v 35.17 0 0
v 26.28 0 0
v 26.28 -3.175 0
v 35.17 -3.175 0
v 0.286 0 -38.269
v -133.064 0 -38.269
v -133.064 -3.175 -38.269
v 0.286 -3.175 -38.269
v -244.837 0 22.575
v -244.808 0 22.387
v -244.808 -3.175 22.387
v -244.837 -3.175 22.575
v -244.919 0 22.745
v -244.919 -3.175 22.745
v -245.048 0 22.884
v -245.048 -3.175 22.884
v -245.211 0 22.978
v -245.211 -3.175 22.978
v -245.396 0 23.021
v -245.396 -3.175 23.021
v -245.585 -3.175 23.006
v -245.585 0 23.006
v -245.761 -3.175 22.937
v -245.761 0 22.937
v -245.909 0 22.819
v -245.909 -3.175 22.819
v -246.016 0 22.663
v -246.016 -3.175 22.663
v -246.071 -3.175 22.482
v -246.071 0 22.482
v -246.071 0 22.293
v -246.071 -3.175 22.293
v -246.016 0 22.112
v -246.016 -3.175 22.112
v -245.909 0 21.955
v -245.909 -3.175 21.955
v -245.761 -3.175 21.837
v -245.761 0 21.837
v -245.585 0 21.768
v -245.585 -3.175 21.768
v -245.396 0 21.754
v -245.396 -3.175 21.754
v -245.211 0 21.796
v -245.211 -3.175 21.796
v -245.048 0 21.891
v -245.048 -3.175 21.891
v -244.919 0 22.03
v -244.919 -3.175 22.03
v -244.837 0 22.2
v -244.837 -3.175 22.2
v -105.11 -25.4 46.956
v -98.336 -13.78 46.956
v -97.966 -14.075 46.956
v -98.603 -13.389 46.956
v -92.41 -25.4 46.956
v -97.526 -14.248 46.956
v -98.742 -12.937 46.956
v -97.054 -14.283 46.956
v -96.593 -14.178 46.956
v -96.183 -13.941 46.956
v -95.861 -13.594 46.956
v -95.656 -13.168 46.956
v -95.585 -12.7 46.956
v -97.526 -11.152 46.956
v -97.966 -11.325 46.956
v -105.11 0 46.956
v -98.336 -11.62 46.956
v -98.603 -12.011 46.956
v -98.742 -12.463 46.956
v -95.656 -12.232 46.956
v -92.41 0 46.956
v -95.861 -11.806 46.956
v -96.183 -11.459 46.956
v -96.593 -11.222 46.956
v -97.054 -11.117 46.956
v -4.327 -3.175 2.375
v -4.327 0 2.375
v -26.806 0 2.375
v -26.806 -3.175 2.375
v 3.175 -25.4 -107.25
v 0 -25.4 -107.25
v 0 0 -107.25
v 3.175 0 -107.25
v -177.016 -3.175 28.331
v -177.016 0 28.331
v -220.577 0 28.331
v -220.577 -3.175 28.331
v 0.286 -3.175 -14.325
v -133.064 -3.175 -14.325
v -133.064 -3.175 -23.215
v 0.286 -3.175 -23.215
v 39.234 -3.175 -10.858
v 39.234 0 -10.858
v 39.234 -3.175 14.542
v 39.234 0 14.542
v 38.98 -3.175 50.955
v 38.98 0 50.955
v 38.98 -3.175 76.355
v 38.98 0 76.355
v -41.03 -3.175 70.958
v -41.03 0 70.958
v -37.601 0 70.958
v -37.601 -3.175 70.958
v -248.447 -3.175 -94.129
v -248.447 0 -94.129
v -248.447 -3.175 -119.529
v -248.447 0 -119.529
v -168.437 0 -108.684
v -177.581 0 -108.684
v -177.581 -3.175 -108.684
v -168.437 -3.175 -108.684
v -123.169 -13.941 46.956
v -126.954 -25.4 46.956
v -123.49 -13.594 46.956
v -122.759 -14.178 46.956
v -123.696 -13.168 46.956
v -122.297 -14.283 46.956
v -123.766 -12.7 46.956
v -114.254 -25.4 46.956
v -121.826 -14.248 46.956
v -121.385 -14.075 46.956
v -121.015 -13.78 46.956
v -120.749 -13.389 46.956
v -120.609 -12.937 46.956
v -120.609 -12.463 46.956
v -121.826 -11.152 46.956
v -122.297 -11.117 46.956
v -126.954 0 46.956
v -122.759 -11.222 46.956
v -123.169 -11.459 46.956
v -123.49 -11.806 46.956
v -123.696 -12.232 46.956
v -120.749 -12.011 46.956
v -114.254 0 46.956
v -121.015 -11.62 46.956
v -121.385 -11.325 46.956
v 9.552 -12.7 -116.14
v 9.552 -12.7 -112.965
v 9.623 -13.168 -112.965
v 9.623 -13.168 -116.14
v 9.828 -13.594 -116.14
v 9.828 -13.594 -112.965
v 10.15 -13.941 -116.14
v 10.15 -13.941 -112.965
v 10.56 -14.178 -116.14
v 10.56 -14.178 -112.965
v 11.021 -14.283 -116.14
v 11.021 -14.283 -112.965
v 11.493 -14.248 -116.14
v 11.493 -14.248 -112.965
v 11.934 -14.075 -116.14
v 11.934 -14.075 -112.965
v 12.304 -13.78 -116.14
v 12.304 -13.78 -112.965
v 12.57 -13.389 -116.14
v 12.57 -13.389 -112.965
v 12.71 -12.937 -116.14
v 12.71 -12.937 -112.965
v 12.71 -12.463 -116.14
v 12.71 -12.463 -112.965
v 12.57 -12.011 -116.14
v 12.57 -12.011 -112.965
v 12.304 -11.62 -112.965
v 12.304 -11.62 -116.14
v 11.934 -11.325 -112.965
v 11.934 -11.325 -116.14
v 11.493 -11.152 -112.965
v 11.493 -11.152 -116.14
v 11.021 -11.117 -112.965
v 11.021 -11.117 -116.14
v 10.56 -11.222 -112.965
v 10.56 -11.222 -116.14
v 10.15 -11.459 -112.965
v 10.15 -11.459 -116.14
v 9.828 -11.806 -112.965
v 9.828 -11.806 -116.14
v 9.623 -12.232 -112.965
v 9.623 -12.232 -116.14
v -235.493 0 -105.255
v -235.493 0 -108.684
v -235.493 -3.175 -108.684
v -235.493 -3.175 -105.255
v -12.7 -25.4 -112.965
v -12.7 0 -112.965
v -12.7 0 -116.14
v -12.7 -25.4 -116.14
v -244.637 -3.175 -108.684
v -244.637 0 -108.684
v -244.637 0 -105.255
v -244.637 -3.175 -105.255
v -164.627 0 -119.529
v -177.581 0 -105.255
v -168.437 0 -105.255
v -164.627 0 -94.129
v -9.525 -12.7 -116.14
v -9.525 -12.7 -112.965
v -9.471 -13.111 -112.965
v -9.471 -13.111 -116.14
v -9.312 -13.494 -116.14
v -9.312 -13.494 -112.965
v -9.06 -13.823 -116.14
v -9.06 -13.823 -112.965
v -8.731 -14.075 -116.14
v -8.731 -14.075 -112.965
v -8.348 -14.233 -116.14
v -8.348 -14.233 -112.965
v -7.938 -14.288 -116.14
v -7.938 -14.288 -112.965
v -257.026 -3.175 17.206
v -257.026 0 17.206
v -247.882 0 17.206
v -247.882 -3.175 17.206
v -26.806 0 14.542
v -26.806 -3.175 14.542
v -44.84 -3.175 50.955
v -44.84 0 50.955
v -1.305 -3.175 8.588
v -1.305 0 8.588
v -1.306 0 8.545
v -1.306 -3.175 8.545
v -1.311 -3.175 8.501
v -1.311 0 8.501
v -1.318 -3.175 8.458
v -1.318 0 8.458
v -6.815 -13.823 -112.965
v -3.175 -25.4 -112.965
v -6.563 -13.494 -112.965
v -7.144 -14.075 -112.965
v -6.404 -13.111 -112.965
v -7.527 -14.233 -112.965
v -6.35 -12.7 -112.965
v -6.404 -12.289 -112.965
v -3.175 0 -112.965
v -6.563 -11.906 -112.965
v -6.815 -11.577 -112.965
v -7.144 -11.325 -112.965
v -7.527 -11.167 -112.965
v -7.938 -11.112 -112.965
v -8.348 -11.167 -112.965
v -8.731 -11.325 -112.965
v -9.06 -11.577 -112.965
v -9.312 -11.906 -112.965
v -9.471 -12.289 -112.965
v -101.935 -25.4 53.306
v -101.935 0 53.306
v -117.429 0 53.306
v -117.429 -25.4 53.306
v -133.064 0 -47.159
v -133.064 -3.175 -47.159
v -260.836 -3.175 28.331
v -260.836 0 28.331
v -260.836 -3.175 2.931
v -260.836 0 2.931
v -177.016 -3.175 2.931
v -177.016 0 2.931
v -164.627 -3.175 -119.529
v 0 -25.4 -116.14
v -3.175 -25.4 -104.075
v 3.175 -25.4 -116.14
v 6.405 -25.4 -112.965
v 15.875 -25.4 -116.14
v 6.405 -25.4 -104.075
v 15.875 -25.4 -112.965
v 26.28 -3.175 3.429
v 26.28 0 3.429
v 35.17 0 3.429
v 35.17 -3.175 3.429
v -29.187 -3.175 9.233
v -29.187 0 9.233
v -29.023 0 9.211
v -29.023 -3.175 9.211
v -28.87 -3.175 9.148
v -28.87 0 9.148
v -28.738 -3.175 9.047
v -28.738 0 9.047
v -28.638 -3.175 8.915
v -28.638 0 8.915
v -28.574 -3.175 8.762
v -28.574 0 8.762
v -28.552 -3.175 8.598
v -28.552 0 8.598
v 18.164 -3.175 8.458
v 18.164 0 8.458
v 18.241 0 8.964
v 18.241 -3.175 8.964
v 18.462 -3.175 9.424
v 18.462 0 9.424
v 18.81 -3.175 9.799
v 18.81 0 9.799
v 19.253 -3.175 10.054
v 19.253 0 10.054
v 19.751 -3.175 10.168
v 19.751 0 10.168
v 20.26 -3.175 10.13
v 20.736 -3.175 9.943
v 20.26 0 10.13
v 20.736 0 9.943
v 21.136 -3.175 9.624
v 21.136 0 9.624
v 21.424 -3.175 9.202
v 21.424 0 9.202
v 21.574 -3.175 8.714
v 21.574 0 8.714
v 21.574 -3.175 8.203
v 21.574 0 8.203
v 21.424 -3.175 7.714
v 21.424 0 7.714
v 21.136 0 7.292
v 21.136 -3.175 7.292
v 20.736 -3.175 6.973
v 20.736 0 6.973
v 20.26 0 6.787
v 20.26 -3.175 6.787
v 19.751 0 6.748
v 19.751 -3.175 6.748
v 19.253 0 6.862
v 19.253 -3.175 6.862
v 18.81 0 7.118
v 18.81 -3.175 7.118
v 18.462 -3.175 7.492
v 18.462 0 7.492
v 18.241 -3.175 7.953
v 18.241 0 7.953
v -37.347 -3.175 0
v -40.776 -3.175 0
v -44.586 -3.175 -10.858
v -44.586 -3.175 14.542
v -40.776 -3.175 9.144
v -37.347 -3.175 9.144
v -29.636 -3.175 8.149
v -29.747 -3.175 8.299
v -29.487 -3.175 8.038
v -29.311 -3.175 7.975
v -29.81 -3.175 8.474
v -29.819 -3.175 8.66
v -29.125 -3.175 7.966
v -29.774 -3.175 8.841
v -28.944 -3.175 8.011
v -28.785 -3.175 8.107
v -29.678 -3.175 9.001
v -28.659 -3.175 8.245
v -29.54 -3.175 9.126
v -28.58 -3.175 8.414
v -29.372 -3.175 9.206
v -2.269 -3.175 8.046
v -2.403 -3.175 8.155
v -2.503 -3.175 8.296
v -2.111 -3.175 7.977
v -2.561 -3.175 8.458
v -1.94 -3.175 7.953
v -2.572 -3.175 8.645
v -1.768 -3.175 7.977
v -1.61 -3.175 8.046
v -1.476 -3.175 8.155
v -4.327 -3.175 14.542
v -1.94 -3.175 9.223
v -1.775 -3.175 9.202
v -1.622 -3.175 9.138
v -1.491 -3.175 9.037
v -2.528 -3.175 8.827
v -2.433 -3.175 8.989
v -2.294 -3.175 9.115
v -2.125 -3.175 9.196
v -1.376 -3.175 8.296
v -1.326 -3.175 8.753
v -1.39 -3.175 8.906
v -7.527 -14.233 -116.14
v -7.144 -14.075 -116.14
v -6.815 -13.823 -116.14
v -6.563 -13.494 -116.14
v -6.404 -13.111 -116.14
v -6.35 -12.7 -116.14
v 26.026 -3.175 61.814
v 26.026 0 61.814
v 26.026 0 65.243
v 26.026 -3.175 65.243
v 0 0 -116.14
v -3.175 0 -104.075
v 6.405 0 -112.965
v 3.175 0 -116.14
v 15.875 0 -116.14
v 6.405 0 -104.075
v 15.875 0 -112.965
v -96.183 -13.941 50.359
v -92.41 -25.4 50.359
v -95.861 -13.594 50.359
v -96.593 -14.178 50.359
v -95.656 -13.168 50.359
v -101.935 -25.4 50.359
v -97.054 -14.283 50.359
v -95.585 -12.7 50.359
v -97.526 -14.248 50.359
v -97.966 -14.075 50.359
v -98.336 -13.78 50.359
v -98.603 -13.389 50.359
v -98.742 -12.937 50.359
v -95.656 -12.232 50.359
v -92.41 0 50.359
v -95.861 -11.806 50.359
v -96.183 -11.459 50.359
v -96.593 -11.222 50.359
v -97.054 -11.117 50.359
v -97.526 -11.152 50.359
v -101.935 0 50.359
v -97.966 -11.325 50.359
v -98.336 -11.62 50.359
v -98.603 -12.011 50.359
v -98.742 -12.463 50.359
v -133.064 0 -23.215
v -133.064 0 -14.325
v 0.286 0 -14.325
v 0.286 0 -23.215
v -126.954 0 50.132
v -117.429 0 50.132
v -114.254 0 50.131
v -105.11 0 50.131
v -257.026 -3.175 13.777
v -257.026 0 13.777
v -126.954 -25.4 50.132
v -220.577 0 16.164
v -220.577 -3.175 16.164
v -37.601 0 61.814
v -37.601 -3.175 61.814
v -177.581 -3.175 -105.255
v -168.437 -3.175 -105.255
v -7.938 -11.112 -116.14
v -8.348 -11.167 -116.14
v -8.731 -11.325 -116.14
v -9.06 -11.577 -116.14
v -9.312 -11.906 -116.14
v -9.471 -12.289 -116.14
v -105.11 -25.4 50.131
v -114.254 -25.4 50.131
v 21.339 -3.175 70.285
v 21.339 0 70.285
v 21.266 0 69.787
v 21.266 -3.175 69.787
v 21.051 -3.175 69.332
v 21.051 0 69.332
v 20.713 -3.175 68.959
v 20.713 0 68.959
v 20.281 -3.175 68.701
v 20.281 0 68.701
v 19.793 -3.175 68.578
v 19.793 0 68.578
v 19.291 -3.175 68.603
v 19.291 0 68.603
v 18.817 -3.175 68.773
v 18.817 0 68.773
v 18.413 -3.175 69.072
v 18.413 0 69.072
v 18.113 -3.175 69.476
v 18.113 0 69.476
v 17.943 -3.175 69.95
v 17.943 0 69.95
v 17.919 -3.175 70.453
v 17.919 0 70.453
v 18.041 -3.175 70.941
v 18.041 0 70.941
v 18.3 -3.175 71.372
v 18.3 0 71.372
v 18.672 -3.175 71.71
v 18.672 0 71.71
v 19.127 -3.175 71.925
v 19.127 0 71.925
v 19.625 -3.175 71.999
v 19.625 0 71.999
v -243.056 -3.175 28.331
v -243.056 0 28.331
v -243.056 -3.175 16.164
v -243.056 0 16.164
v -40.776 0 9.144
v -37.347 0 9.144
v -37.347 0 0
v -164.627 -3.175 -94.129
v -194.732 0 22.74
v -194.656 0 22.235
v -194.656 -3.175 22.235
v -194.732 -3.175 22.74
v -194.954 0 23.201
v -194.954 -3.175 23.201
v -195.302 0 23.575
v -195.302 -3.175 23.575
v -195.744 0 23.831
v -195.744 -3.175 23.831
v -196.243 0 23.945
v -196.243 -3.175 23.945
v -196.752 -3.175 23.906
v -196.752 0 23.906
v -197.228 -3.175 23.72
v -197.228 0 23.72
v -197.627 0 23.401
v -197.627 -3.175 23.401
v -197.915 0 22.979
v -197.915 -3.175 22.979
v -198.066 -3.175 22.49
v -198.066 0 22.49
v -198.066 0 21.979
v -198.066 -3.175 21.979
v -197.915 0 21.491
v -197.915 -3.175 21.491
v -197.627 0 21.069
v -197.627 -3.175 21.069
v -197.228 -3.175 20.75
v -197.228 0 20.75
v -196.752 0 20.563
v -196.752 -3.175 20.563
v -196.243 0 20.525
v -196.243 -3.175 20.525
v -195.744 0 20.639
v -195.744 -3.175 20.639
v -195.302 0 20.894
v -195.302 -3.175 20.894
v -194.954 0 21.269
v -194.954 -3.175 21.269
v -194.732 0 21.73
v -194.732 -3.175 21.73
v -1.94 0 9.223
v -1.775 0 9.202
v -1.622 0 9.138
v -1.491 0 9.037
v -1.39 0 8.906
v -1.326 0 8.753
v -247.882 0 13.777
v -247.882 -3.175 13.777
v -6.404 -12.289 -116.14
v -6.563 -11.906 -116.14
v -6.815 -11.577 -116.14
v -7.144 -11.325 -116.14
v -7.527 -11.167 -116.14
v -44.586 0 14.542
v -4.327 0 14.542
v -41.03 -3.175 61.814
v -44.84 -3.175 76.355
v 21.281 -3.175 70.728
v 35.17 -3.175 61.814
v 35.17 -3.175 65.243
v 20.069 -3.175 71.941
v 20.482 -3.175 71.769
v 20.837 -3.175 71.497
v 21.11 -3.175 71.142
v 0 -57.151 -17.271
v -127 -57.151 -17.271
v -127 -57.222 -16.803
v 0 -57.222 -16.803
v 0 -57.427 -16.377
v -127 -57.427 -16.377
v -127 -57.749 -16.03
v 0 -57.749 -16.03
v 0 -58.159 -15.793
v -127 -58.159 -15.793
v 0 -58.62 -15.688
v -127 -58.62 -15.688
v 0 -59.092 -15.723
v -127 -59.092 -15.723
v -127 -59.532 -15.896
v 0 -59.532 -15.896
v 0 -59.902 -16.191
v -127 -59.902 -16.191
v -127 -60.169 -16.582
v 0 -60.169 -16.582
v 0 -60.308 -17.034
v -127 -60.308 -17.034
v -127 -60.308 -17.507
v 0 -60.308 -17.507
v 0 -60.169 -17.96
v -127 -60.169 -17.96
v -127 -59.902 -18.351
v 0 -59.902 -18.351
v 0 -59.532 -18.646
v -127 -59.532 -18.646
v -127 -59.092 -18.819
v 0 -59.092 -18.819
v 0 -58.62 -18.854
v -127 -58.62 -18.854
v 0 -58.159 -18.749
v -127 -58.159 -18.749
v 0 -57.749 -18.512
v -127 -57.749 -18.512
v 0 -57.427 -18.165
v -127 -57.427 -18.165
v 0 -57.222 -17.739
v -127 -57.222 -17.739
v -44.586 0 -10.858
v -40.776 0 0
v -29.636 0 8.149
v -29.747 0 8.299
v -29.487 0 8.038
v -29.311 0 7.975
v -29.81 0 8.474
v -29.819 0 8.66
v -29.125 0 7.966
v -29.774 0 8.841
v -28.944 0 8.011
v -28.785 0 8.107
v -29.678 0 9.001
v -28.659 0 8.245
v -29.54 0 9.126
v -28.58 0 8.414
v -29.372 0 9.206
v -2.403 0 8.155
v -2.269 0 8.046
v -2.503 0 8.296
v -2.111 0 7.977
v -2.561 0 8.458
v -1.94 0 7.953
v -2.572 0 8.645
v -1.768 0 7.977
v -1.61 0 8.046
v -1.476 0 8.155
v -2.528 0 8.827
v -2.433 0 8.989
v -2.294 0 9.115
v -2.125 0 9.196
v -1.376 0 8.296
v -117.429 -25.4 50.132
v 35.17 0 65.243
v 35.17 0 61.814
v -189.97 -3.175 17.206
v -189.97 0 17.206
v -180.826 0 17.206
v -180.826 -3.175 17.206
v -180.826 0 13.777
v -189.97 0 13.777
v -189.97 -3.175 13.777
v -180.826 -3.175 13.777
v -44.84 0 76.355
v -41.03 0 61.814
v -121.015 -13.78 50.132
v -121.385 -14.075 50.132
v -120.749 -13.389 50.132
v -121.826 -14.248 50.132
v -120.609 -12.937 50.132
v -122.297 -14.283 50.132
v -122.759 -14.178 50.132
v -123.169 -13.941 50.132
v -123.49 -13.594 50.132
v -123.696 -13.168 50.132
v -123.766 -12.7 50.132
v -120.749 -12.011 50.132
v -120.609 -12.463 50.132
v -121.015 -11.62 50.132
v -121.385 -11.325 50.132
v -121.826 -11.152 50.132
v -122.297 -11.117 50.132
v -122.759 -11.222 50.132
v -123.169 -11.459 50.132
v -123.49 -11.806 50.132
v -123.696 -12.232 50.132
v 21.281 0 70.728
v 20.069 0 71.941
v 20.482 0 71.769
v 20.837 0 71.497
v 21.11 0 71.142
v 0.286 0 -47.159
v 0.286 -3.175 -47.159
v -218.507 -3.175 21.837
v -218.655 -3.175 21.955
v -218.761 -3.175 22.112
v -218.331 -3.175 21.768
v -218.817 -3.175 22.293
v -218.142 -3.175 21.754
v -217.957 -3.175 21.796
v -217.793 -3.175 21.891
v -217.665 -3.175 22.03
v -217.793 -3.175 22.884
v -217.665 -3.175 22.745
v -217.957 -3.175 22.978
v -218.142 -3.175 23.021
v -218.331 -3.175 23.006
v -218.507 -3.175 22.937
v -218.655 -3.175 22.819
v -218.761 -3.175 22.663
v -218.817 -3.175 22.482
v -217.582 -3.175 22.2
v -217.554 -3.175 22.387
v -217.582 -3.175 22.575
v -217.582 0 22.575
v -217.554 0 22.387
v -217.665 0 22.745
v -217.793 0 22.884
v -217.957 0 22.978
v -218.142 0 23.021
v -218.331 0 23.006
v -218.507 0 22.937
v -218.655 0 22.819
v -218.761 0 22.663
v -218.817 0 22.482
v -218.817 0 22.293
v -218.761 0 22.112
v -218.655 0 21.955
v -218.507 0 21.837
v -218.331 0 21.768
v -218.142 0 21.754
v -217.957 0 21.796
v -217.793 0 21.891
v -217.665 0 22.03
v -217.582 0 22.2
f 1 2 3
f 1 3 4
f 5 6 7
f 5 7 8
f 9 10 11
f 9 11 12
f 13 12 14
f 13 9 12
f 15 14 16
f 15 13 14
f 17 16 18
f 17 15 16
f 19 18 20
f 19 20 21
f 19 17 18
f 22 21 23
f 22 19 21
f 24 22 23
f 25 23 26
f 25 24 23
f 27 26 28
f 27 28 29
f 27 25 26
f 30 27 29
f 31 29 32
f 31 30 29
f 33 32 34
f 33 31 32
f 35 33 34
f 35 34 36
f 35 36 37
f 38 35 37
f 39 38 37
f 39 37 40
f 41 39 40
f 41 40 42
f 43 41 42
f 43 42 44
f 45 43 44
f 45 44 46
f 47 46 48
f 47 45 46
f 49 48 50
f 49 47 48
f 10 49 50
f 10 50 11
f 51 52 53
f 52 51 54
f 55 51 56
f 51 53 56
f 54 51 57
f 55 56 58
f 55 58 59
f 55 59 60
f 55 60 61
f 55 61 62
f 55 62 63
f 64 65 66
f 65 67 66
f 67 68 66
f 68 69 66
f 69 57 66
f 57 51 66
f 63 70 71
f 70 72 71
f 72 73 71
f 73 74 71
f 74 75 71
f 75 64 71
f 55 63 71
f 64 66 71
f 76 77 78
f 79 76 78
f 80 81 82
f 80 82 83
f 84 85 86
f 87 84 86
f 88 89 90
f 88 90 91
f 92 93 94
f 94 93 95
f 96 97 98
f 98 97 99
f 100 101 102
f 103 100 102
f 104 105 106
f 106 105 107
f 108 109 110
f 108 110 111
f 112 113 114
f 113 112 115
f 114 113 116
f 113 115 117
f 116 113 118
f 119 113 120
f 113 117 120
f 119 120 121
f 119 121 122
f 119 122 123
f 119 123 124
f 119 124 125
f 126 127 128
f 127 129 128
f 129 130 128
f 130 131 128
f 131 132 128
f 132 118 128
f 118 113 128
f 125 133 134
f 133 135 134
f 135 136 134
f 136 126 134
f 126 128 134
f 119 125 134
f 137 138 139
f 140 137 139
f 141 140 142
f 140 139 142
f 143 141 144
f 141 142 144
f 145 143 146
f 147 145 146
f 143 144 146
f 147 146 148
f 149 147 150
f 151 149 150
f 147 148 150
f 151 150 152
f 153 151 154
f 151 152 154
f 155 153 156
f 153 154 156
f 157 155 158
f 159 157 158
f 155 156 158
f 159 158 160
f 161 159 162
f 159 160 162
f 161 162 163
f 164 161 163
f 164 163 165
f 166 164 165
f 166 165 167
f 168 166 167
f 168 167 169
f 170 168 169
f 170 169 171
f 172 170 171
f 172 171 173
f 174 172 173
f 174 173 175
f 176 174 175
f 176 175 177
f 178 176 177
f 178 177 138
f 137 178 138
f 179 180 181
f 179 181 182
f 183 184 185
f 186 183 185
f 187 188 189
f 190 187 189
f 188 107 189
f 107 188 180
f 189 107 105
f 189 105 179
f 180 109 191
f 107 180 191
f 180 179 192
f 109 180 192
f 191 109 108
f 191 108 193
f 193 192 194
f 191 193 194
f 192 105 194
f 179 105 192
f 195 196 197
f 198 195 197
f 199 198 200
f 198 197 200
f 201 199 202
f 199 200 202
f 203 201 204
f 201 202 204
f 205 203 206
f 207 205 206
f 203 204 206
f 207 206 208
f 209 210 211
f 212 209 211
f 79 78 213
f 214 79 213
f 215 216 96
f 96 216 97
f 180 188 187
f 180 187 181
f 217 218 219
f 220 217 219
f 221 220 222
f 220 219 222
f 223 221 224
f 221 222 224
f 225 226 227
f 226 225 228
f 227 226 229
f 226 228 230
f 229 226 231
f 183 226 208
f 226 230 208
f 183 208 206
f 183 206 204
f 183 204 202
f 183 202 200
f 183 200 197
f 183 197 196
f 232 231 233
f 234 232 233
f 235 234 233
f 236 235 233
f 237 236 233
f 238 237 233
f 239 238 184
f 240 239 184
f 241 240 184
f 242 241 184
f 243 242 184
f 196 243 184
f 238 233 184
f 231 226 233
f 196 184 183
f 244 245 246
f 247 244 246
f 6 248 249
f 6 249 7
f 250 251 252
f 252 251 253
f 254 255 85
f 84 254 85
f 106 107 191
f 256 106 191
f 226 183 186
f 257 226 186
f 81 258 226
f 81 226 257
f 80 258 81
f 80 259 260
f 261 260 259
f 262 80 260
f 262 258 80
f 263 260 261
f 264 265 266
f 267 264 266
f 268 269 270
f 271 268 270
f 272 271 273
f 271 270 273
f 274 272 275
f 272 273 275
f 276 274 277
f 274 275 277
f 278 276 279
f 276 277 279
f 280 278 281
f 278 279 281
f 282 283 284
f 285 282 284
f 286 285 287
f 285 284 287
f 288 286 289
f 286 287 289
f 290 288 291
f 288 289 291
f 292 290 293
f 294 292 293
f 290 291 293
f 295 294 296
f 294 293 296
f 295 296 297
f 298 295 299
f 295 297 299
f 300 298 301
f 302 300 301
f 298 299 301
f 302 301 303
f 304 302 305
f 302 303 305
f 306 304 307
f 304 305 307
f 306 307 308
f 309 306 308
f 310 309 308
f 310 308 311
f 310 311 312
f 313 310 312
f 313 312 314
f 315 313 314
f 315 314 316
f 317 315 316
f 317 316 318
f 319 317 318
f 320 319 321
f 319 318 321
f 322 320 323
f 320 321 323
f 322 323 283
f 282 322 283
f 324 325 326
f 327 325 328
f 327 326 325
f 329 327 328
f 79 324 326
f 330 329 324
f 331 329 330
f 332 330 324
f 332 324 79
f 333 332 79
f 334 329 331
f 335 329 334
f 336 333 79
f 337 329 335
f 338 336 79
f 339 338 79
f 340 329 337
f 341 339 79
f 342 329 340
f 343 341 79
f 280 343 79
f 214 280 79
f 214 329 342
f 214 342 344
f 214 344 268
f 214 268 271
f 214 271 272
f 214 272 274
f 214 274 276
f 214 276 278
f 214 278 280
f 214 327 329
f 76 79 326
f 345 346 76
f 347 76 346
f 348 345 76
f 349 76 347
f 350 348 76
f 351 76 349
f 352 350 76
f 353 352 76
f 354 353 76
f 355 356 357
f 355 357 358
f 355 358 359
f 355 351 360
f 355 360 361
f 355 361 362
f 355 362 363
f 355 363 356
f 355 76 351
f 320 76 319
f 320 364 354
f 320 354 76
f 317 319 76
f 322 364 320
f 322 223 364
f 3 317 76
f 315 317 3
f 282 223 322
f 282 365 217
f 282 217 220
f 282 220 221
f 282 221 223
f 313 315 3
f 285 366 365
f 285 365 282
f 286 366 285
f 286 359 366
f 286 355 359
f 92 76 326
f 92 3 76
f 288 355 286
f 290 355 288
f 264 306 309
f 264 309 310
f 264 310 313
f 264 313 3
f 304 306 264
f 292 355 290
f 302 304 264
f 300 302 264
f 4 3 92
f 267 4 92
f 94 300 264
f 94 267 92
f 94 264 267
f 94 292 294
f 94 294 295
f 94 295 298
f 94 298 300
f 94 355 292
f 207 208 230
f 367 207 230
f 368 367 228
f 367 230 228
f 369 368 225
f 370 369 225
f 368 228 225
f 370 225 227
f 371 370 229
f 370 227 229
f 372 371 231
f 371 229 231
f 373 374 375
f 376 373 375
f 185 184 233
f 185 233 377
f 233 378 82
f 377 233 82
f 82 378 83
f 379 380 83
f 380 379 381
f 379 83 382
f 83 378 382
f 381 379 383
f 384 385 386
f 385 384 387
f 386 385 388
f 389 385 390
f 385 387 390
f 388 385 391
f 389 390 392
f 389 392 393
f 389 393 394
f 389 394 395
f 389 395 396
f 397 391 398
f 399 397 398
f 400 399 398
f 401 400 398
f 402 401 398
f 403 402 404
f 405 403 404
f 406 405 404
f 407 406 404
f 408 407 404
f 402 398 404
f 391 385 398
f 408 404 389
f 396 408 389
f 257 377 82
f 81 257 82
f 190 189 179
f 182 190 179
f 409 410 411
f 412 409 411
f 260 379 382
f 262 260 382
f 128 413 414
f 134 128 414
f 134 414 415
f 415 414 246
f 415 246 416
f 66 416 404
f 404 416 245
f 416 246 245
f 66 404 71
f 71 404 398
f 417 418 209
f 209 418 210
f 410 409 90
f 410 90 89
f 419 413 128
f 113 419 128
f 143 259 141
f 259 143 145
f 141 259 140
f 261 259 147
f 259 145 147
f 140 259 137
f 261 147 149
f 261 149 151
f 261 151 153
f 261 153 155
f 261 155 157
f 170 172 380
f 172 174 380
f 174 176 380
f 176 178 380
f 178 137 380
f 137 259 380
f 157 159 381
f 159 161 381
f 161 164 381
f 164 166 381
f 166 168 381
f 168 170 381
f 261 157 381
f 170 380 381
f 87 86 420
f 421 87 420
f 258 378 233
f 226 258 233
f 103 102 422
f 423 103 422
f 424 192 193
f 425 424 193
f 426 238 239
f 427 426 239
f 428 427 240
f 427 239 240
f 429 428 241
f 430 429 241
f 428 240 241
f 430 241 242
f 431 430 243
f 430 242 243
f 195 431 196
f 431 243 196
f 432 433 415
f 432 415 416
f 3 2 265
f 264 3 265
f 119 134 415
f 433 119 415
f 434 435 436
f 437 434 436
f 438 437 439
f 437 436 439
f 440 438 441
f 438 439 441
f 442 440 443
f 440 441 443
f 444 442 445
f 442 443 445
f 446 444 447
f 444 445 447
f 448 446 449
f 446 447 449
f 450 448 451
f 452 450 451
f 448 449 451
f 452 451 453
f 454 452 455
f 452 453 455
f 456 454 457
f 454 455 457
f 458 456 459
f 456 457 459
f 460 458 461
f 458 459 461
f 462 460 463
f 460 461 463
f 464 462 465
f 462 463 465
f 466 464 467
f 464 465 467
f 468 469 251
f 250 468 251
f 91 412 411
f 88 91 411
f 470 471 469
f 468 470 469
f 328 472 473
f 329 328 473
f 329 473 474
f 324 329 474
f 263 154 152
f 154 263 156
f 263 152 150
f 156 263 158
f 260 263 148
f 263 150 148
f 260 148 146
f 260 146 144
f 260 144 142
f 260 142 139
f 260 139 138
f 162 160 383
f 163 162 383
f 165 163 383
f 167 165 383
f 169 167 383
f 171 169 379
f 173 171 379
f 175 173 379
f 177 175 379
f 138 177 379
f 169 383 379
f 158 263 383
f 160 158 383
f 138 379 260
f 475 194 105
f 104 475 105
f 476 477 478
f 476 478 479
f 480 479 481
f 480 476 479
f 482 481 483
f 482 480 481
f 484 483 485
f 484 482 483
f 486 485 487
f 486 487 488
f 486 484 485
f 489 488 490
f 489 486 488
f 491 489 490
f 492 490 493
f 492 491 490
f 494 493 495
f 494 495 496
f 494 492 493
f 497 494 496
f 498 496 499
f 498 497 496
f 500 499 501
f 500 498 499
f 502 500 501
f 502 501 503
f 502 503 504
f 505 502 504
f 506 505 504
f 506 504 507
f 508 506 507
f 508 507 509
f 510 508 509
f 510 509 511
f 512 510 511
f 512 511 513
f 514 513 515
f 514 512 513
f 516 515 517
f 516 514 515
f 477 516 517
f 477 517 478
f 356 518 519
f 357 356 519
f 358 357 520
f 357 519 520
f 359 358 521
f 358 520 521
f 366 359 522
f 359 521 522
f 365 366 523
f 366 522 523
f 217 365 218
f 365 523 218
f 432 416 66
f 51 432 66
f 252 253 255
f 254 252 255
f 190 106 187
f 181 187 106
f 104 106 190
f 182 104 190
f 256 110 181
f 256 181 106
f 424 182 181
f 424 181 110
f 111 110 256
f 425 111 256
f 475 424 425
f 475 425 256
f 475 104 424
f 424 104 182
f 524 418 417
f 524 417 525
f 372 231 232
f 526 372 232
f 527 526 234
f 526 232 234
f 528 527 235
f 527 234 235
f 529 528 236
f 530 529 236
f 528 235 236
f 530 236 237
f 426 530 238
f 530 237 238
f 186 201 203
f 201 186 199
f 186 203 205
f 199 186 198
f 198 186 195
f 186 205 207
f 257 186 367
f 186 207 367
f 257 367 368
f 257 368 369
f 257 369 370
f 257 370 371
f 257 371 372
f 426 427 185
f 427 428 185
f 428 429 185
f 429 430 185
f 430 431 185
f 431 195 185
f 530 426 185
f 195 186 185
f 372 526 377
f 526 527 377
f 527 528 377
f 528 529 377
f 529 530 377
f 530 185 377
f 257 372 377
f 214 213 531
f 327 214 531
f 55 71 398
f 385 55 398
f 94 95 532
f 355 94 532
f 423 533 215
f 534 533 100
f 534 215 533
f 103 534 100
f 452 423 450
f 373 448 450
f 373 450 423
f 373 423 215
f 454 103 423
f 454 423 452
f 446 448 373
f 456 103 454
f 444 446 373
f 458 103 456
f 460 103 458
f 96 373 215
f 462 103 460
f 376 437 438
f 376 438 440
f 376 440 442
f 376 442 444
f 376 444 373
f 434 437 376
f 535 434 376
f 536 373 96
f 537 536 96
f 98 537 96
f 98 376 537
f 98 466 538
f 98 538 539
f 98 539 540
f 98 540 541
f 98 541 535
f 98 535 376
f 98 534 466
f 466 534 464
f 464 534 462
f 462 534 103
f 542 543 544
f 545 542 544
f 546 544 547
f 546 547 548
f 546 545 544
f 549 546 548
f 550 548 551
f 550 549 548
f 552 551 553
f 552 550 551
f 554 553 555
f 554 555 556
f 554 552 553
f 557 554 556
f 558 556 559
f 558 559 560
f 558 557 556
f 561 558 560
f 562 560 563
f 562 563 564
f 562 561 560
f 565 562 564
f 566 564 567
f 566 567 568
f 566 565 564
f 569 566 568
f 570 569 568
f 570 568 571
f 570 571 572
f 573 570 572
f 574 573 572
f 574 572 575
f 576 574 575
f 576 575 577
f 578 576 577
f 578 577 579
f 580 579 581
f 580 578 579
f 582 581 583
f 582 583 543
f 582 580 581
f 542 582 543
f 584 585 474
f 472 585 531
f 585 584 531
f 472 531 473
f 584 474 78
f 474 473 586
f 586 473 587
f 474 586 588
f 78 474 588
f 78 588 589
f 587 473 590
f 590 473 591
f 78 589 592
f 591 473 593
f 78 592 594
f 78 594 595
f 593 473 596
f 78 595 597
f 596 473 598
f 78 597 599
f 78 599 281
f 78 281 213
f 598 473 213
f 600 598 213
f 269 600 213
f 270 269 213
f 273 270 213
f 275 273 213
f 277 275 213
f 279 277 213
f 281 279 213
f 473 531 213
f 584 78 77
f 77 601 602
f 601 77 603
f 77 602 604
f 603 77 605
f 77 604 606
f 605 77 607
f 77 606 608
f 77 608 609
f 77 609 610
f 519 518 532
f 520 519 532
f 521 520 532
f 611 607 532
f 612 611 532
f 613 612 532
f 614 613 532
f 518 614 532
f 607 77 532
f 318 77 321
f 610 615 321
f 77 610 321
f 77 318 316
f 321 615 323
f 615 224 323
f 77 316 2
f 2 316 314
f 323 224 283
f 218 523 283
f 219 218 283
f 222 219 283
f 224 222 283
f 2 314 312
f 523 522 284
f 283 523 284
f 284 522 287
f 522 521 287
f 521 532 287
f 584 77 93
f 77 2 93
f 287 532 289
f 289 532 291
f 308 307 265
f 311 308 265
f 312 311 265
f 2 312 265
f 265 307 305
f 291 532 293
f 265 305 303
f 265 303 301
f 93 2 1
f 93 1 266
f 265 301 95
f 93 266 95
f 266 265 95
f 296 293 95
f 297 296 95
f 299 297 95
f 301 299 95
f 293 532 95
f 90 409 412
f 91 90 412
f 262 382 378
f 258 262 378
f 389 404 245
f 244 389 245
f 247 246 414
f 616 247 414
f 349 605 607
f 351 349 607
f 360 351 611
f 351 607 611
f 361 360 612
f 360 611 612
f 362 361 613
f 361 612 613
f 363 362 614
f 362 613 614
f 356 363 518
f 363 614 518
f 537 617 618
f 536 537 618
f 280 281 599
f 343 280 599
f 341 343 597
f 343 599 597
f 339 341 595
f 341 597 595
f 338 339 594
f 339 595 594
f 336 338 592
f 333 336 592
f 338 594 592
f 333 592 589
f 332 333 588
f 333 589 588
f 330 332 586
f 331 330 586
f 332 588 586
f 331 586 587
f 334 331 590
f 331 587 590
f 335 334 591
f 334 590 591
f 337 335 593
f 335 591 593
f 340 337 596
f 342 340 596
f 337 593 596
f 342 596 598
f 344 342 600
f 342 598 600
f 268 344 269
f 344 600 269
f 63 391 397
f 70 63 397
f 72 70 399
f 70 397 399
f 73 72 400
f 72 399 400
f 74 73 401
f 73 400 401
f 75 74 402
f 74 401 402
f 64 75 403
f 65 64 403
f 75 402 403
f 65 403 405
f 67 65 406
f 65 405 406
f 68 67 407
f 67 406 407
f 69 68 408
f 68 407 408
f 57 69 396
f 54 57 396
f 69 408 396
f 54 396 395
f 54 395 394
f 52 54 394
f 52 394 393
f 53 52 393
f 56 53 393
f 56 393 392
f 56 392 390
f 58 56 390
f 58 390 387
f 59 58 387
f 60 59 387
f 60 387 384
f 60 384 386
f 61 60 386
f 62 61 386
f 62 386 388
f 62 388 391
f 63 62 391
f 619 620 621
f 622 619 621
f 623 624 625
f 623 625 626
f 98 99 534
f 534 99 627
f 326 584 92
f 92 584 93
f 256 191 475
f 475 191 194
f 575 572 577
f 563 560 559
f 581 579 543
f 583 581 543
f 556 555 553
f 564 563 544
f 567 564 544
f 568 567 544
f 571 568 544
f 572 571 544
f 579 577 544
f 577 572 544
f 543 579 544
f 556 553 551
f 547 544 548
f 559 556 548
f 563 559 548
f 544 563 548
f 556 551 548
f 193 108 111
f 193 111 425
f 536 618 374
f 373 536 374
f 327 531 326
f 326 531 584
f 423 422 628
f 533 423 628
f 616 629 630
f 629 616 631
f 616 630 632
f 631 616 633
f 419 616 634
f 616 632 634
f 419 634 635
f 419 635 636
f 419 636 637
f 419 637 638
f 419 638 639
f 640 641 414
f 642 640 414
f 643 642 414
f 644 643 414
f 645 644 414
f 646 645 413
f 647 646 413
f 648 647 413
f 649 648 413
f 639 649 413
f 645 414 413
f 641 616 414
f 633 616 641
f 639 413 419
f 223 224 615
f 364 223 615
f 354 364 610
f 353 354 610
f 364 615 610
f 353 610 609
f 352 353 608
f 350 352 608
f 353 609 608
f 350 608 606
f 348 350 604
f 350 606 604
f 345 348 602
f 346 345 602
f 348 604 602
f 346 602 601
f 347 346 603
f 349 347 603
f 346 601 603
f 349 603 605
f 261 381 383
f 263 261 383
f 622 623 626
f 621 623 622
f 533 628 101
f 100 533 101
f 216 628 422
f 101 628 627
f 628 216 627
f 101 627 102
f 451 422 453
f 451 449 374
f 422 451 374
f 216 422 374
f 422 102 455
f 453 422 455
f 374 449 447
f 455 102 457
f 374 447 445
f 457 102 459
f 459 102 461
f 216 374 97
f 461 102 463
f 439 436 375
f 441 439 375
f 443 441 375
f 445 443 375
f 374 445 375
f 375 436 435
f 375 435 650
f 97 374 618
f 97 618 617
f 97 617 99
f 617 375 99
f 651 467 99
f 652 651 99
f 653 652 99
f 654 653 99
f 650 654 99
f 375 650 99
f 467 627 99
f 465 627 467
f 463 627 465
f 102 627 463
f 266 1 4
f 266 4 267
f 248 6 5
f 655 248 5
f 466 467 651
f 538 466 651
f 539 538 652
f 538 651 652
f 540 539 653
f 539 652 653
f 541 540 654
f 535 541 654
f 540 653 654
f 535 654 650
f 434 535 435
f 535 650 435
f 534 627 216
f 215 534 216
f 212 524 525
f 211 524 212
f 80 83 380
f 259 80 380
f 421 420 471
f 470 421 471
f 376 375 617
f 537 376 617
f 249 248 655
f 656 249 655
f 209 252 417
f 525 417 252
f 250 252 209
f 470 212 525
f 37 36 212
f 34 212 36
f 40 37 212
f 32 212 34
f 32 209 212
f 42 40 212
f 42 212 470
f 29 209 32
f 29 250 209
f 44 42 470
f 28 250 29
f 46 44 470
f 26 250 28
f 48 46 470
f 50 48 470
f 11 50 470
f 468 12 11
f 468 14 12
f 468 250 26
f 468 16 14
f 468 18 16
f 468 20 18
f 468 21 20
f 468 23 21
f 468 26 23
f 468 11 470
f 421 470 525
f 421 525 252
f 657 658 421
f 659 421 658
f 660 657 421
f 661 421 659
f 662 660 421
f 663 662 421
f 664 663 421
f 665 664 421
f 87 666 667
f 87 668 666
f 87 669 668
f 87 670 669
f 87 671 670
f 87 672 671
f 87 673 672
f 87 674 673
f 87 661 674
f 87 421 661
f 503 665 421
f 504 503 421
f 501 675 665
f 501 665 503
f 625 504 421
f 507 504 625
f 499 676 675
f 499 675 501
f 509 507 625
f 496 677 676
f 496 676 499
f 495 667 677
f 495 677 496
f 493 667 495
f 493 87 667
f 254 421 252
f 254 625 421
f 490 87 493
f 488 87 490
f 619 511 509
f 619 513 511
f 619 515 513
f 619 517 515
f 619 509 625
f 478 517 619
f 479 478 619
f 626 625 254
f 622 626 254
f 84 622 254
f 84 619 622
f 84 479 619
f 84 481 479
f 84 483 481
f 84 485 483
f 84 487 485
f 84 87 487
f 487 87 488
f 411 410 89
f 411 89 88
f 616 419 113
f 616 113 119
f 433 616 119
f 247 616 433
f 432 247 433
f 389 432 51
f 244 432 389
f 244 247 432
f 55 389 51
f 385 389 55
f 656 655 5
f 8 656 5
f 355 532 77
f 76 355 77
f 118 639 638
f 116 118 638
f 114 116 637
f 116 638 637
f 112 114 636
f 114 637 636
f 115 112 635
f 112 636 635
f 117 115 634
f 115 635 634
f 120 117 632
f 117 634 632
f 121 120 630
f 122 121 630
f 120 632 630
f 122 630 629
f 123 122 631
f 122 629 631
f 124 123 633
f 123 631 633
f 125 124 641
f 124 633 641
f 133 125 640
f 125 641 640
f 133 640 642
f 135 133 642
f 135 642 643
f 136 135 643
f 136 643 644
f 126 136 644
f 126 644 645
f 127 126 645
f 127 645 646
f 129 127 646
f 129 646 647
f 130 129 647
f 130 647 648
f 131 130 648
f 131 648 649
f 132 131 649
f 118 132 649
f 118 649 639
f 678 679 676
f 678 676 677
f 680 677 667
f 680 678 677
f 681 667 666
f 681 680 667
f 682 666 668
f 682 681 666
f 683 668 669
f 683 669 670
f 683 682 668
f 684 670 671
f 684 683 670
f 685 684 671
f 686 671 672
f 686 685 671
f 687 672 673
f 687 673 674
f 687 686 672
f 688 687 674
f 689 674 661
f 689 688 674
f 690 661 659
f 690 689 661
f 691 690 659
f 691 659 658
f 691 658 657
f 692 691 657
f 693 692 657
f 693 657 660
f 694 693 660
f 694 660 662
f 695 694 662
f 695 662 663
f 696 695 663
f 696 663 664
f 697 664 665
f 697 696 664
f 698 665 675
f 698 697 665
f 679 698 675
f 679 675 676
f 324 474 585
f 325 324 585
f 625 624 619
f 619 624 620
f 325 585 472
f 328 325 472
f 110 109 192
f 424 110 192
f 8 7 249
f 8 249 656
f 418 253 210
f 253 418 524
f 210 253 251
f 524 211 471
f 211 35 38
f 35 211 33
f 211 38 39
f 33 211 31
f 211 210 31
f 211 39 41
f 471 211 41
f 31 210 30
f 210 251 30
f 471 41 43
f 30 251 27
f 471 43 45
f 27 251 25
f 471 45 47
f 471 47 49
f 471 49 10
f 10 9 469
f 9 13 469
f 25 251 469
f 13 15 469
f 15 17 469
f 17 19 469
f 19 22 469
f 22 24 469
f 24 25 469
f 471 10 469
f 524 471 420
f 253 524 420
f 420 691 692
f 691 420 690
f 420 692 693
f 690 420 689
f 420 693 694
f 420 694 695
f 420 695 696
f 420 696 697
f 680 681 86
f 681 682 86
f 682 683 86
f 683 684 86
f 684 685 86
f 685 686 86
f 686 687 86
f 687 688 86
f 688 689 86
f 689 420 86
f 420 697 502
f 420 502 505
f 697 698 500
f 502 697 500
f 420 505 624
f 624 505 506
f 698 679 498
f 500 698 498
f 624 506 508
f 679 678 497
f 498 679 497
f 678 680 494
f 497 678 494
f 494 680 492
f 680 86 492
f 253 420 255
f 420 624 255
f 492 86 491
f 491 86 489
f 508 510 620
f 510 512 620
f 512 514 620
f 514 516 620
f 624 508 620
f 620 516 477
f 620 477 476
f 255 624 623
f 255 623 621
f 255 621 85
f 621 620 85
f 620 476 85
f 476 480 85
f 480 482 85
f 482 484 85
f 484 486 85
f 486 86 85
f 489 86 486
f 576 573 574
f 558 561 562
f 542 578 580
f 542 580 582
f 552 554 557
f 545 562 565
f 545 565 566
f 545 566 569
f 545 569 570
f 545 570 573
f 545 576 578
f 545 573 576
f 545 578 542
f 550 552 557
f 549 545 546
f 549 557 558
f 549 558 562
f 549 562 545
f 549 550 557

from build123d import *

# Parameters (mm, degrees)
F0_W      = 133.35
F0_H      = 8.89
F1_DEPTH  = 3.175
F2_DEPTH  = 3.175
F0_W_2    = 5.715
F0_H_2    = 3.429
F0_W_3    = 3.429
F0_H_3    = 5.715
F3_DEPTH  = 3.175
F0_W_4    = 8.89
F0_W_5    = 5.461
F4_DEPTH  = 3.175
F5_DEPTH  = 25.4
F6_R      = 1.5875
F8_DEPTH  = 97.2919927368
F0_W_6    = 9.144
F0_R      = 0.635
F0_R_2    = 1.7145
F9_DEPTH  = 3.175
F10_DEPTH = 3.175
F11_R     = 1.5875
F12_DEPTH = 127
F13_DEPTH = 25.4
F16_DEPTH = 6.5659173141


# Not quite as in the source:
# - a feature names something its author has since deleted; it is built from what else it names


with BuildPart() as f1:
    # F0 (on Front) → F1 (new body)
    with BuildSketch(Plane.XZ):
        with Locations((-66.3894339323, -18.7695804912)):
            Rectangle(F0_W, F0_H)
    extrude(amount=F1_DEPTH)


with BuildPart() as f2:
    # F0 (on Front) → F2 (new body)
    with BuildSketch(Plane.XZ):
        with Locations((-66.3894339323, -42.7141800451)):
            Rectangle(F0_W, F0_H)
    extrude(amount=F2_DEPTH)


with BuildPart() as f3:
    # F0 (on Front) → F3 (new body)
    with BuildSketch(Plane.XZ):
        Polygon((-41.0302151682, 76.3552769363), (-44.8402151682, 76.3552769363), (-44.8402151682, 50.9552769363), (38.9797848318, 50.9552769363), (38.9797848318, 76.3552769363), (35.1697848318, 76.3552769363), (19.6249848318, 76.3552769363), (9.5919848318, 76.3552769363), align=None)
        Polygon((-41.0302151682, 65.2427769363), (-41.0302151682, 70.9577769363), (-37.6012151682, 70.9577769363), (-37.6012151682, 65.2427769363), (-31.8862151682, 65.2427769363), (-31.8862151682, 61.8137769363), (-37.6012151682, 61.8137769363), (-41.0302151682, 61.8137769363), align=None, mode=Mode.SUBTRACT)
        with BuildLine():
            ThreePointArc((21.3394848318, 70.2846769363), (18.4126502554, 69.0723423599), (19.6249848318, 71.9991769363))
            ThreePointArc((19.6249848318, 71.9991769363), (20.8373194081, 71.4970115126), (21.3394848318, 70.2846769363))
        make_face(mode=Mode.SUBTRACT)
        Polygon((31.7407848318, 70.9577769363), (35.1697848318, 70.9577769363), (35.1697848318, 65.2427769363), (35.1697848318, 61.8137769363), (31.7407848318, 61.8137769363), (26.0257848318, 61.8137769363), (26.0257848318, 65.2427769363), (31.7407848318, 65.2427769363), align=None, mode=Mode.SUBTRACT)
        with Locations((-34.7437151682, 63.5282769363)):
            Rectangle(F0_W_2, F0_H_2)
        with Locations((33.4552848318, 68.1002769363)):
            Rectangle(F0_W_3, F0_H_3)
    extrude(amount=F3_DEPTH)


with BuildPart() as f4:
    # F0 (on Front) → F4 (new body)
    with BuildSketch(Plane.XZ):
        with BuildLine():
            Line((-40.7762151682, 14.5415), (-44.5862151682, 14.5415))
            Line((-44.5862151682, 14.5415), (-44.5862151682, -10.8585))
            Line((-44.5862151682, -10.8585), (-28.4685809165, -10.8585))
            Line((-28.4685809165, -10.8585), (-5.4275859147, -10.8585))
            Line((-5.4275859147, -10.8585), (35.4237848318, -10.8585))
            Line((35.4237848318, -10.8585), (39.2337848318, -10.8585))
            Line((39.2337848318, -10.8585), (39.2337848318, 14.5415))
            Line((39.2337848318, 14.5415), (9.8332848318, 14.5415))
            Line((9.8332848318, 14.5415), (-1.9396151682, 14.5415))
            Line((-1.9396151682, 14.5415), (-1.9396151682, 9.223375))
            ThreePointArc((-1.9396151682, 9.223375), (-1.4906023622, 9.0373878061), (-1.3046151682, 8.588375))
            ThreePointArc((-1.3046151682, 8.588375), (-1.3079957034, 8.5229391406), (-1.3181013153, 8.4582))
            ThreePointArc((-1.3181013153, 8.4582), (-1.9396151682, 7.953375), (-2.5611290212, 8.4582))
            Line((-2.5611290212, 8.4582), (-4.3272151682, 8.4582))
            Line((-4.3272151682, 8.4582), (-4.3272151682, 2.3749))
            Line((-4.3272151682, 2.3749), (-26.8062151682, 2.3749))
            Line((-26.8062151682, 2.3749), (-26.8062151682, 8.5979))
            Line((-26.8062151682, 8.5979), (-28.5524651682, 8.5979))
            ThreePointArc((-28.5524651682, 8.5979), (-29.6364779743, 8.1488871939), (-29.1874651682, 9.2329))
            Line((-29.1874651682, 9.2329), (-29.1874651682, 14.5415))
            Line((-29.1874651682, 14.5415), (-40.7762151682, 14.5415))
        make_face()
        Polygon((-40.7762151682, 3.429), (-40.7762151682, 9.144), (-37.3472151682, 9.144), (-37.3472151682, 3.429), (-31.8862151682, 3.429), (-31.8862151682, 0), (-37.3472151682, 0), (-40.7762151682, 0), align=None, mode=Mode.SUBTRACT)
        with Locations((30.7247848318, 1.7145)):
            Rectangle(F0_W_4, F0_H_2, mode=Mode.SUBTRACT)
        with BuildLine():
            ThreePointArc((21.5934848318, 8.4582), (19.8789848318, 6.7437), (18.1644848318, 8.4582))
            ThreePointArc((18.1644848318, 8.4582), (19.8789848318, 10.1727), (21.5934848318, 8.4582))
        make_face(mode=Mode.SUBTRACT)
        with BuildLine():
            Line((-26.8062151682, 14.5415), (-29.1874651682, 14.5415))
            Line((-29.1874651682, 14.5415), (-29.1874651682, 9.2329))
            ThreePointArc((-29.1874651682, 9.2329), (-28.7384523622, 9.0469128061), (-28.5524651682, 8.5979))
            Line((-28.5524651682, 8.5979), (-26.8062151682, 8.5979))
            Line((-26.8062151682, 8.5979), (-26.8062151682, 14.5415))
        make_face()
        with BuildLine():
            Line((-1.9396151682, 14.5415), (-4.3272151682, 14.5415))
            Line((-4.3272151682, 14.5415), (-4.3272151682, 8.588375))
            Line((-4.3272151682, 8.588375), (-4.3272151682, 8.4582))
            Line((-4.3272151682, 8.4582), (-2.5611290212, 8.4582))
            ThreePointArc((-2.5611290212, 8.4582), (-2.4325077148, 8.9887272668), (-1.9396151682, 9.223375))
            Line((-1.9396151682, 9.223375), (-1.9396151682, 14.5415))
        make_face()
        with Locations((-34.6167151682, 1.7145)):
            Rectangle(F0_W_5, F0_H_2)
    extrude(amount=F4_DEPTH)


with BuildPart() as f5:
    # F0 (on Front) → F5 (new body)
    with BuildSketch(Plane.XZ):
        Polygon((-101.9350041685, 53.3056003809), (-117.4290041685, 53.3056003809), (-117.4290041685, 50.1318126917), (-126.9540041685, 50.1318126917), (-126.9540041685, 46.9556003809), (-114.2540041685, 46.9556003809), (-114.2540041685, 50.1306003809), (-105.1100041685, 50.1306003809), (-105.1100041685, 46.9556003809), (-92.4100041685, 46.9556003809), (-92.4100041685, 50.3586865962), (-101.9350041685, 50.3586865962), align=None)
    extrude(amount=F5_DEPTH)

    # F7 (on face) + F6 (on face) → F8 (cut, through all)
    with BuildSketch(Plane.XY.offset(50.1318126917)):
        with BuildLine():
            ThreePointArc((-120.5913041685, -12.7), (-122.1788041685, -11.1125), (-123.7663041685, -12.7))
            ThreePointArc((-123.7663041685, -12.7), (-122.1788041685, -14.2875), (-120.5913041685, -12.7))
        make_face()
    with BuildSketch(Plane.XY.offset(50.3586865962)):
        with Locations((-97.1725041685, -12.7)):
            Circle(F6_R)
    extrude(amount=-F8_DEPTH, mode=Mode.SUBTRACT)


with BuildPart() as f9:
    # F0 (on Front) → F9 (new body)
    with BuildSketch(Plane.XZ):
        Polygon((-257.0258561993, 28.3309499077), (-260.8358561993, 28.3309499077), (-260.8358561993, 22.2349499077), (-260.8358561993, 2.9309499077), (-177.0158561993, 2.9309499077), (-177.0158561993, 28.3309499077), (-180.8258561993, 28.3309499077), (-206.4036561993, 28.3309499077), (-220.5768561993, 28.3309499077), (-220.5768561993, 16.1643499077), (-243.0558561993, 16.1643499077), (-243.0558561993, 28.3309499077), align=None)
        with Locations((-252.4538561993, 15.4912499077)):
            Rectangle(F0_W_6, F0_H_2, mode=Mode.SUBTRACT)
        with Locations((-245.4434561993, 22.3873499077)):
            Circle(F0_R, mode=Mode.SUBTRACT)
        with Locations((-218.1892561993, 22.3873499077)):
            Circle(F0_R, mode=Mode.SUBTRACT)
        with Locations((-196.3706561993, 22.2349499077)):
            Circle(F0_R_2, mode=Mode.SUBTRACT)
        with Locations((-185.3978561993, 15.4912499077)):
            Rectangle(F0_W_6, F0_H_2, mode=Mode.SUBTRACT)
    extrude(amount=F9_DEPTH)


with BuildPart() as f10:
    # F0 (on Front) → F10 (new body)
    with BuildSketch(Plane.XZ):
        Polygon((-244.6372990036, -94.1294633508), (-248.4472990036, -94.1294633508), (-248.4472990036, -119.5294633508), (-164.6272990036, -119.5294633508), (-164.6272990036, -94.1294633508), (-168.4372990036, -94.1294633508), align=None)
        with Locations((-240.0652990036, -106.9691633508)):
            Rectangle(F0_W_6, F0_H_2, mode=Mode.SUBTRACT)
        with Locations((-173.0092990036, -106.9691633508)):
            Rectangle(F0_W_6, F0_H_2, mode=Mode.SUBTRACT)
    extrude(amount=F10_DEPTH)


with BuildPart() as f12:
    # F11 (on Right) → F12 (new body)
    with BuildSketch(Plane.YZ):
        with Locations((-58.7386116385, -17.2708369792)):
            Circle(F11_R)
    extrude(amount=-F12_DEPTH)


with BuildPart() as f13:
    # F0 (on Front) → F13 (new body)
    with BuildSketch(Plane.XZ):
        Polygon((6.4046707157, -104.0745460367), (-3.175, -104.0745460367), (-3.175, -112.9645460367), (-12.7, -112.9645460367), (-12.7, -116.1395460367), (0, -116.1395460367), (0, -107.2495460367), (3.175, -107.2495460367), (3.175, -116.1395460367), (15.875, -116.1395460367), (15.875, -112.9650167625), (6.4046707157, -112.9650167625), align=None)
    extrude(amount=F13_DEPTH)

    # F14 (on face) + F15 (on face) → F16 (cut, through all)
    with BuildSketch(Plane.XY.offset(-112.9645460367)):
        with BuildLine():
            Line((-7.9375, -11.1125), (-7.9375, -12.7))
            Line((-7.9375, -12.7), (-7.9375, -14.2875))
            ThreePointArc((-7.9375, -14.2875), (-6.8149679849, -13.8225320151), (-6.35, -12.7))
            ThreePointArc((-6.35, -12.7), (-6.8149679849, -11.5774679849), (-7.9375, -11.1125))
        make_face()
        with BuildLine():
            Line((-7.9375, -12.7), (-9.525, -12.7))
            ThreePointArc((-9.525, -12.7), (-9.0600320151, -13.8225320151), (-7.9375, -14.2875))
            Line((-7.9375, -14.2875), (-7.9375, -12.7))
        make_face()
        with BuildLine():
            ThreePointArc((-7.9375, -11.1125), (-9.0600320151, -11.5774679849), (-9.525, -12.7))
            Line((-9.525, -12.7), (-7.9375, -12.7))
            Line((-7.9375, -12.7), (-7.9375, -11.1125))
        make_face()
    with BuildSketch(Plane.XY.offset(-112.9650167625)):
        with BuildLine():
            ThreePointArc((12.7273353579, -12.7), (11.1398353579, -11.1125), (9.5523353579, -12.7))
            ThreePointArc((9.5523353579, -12.7), (11.1398353579, -14.2875), (12.7273353579, -12.7))
        make_face()
    extrude(amount=-F16_DEPTH, mode=Mode.SUBTRACT)


solid = Compound([f1.part, f2.part, f3.part, f4.part, f5.part, f9.part, f10.part, f12.part, f13.part])
